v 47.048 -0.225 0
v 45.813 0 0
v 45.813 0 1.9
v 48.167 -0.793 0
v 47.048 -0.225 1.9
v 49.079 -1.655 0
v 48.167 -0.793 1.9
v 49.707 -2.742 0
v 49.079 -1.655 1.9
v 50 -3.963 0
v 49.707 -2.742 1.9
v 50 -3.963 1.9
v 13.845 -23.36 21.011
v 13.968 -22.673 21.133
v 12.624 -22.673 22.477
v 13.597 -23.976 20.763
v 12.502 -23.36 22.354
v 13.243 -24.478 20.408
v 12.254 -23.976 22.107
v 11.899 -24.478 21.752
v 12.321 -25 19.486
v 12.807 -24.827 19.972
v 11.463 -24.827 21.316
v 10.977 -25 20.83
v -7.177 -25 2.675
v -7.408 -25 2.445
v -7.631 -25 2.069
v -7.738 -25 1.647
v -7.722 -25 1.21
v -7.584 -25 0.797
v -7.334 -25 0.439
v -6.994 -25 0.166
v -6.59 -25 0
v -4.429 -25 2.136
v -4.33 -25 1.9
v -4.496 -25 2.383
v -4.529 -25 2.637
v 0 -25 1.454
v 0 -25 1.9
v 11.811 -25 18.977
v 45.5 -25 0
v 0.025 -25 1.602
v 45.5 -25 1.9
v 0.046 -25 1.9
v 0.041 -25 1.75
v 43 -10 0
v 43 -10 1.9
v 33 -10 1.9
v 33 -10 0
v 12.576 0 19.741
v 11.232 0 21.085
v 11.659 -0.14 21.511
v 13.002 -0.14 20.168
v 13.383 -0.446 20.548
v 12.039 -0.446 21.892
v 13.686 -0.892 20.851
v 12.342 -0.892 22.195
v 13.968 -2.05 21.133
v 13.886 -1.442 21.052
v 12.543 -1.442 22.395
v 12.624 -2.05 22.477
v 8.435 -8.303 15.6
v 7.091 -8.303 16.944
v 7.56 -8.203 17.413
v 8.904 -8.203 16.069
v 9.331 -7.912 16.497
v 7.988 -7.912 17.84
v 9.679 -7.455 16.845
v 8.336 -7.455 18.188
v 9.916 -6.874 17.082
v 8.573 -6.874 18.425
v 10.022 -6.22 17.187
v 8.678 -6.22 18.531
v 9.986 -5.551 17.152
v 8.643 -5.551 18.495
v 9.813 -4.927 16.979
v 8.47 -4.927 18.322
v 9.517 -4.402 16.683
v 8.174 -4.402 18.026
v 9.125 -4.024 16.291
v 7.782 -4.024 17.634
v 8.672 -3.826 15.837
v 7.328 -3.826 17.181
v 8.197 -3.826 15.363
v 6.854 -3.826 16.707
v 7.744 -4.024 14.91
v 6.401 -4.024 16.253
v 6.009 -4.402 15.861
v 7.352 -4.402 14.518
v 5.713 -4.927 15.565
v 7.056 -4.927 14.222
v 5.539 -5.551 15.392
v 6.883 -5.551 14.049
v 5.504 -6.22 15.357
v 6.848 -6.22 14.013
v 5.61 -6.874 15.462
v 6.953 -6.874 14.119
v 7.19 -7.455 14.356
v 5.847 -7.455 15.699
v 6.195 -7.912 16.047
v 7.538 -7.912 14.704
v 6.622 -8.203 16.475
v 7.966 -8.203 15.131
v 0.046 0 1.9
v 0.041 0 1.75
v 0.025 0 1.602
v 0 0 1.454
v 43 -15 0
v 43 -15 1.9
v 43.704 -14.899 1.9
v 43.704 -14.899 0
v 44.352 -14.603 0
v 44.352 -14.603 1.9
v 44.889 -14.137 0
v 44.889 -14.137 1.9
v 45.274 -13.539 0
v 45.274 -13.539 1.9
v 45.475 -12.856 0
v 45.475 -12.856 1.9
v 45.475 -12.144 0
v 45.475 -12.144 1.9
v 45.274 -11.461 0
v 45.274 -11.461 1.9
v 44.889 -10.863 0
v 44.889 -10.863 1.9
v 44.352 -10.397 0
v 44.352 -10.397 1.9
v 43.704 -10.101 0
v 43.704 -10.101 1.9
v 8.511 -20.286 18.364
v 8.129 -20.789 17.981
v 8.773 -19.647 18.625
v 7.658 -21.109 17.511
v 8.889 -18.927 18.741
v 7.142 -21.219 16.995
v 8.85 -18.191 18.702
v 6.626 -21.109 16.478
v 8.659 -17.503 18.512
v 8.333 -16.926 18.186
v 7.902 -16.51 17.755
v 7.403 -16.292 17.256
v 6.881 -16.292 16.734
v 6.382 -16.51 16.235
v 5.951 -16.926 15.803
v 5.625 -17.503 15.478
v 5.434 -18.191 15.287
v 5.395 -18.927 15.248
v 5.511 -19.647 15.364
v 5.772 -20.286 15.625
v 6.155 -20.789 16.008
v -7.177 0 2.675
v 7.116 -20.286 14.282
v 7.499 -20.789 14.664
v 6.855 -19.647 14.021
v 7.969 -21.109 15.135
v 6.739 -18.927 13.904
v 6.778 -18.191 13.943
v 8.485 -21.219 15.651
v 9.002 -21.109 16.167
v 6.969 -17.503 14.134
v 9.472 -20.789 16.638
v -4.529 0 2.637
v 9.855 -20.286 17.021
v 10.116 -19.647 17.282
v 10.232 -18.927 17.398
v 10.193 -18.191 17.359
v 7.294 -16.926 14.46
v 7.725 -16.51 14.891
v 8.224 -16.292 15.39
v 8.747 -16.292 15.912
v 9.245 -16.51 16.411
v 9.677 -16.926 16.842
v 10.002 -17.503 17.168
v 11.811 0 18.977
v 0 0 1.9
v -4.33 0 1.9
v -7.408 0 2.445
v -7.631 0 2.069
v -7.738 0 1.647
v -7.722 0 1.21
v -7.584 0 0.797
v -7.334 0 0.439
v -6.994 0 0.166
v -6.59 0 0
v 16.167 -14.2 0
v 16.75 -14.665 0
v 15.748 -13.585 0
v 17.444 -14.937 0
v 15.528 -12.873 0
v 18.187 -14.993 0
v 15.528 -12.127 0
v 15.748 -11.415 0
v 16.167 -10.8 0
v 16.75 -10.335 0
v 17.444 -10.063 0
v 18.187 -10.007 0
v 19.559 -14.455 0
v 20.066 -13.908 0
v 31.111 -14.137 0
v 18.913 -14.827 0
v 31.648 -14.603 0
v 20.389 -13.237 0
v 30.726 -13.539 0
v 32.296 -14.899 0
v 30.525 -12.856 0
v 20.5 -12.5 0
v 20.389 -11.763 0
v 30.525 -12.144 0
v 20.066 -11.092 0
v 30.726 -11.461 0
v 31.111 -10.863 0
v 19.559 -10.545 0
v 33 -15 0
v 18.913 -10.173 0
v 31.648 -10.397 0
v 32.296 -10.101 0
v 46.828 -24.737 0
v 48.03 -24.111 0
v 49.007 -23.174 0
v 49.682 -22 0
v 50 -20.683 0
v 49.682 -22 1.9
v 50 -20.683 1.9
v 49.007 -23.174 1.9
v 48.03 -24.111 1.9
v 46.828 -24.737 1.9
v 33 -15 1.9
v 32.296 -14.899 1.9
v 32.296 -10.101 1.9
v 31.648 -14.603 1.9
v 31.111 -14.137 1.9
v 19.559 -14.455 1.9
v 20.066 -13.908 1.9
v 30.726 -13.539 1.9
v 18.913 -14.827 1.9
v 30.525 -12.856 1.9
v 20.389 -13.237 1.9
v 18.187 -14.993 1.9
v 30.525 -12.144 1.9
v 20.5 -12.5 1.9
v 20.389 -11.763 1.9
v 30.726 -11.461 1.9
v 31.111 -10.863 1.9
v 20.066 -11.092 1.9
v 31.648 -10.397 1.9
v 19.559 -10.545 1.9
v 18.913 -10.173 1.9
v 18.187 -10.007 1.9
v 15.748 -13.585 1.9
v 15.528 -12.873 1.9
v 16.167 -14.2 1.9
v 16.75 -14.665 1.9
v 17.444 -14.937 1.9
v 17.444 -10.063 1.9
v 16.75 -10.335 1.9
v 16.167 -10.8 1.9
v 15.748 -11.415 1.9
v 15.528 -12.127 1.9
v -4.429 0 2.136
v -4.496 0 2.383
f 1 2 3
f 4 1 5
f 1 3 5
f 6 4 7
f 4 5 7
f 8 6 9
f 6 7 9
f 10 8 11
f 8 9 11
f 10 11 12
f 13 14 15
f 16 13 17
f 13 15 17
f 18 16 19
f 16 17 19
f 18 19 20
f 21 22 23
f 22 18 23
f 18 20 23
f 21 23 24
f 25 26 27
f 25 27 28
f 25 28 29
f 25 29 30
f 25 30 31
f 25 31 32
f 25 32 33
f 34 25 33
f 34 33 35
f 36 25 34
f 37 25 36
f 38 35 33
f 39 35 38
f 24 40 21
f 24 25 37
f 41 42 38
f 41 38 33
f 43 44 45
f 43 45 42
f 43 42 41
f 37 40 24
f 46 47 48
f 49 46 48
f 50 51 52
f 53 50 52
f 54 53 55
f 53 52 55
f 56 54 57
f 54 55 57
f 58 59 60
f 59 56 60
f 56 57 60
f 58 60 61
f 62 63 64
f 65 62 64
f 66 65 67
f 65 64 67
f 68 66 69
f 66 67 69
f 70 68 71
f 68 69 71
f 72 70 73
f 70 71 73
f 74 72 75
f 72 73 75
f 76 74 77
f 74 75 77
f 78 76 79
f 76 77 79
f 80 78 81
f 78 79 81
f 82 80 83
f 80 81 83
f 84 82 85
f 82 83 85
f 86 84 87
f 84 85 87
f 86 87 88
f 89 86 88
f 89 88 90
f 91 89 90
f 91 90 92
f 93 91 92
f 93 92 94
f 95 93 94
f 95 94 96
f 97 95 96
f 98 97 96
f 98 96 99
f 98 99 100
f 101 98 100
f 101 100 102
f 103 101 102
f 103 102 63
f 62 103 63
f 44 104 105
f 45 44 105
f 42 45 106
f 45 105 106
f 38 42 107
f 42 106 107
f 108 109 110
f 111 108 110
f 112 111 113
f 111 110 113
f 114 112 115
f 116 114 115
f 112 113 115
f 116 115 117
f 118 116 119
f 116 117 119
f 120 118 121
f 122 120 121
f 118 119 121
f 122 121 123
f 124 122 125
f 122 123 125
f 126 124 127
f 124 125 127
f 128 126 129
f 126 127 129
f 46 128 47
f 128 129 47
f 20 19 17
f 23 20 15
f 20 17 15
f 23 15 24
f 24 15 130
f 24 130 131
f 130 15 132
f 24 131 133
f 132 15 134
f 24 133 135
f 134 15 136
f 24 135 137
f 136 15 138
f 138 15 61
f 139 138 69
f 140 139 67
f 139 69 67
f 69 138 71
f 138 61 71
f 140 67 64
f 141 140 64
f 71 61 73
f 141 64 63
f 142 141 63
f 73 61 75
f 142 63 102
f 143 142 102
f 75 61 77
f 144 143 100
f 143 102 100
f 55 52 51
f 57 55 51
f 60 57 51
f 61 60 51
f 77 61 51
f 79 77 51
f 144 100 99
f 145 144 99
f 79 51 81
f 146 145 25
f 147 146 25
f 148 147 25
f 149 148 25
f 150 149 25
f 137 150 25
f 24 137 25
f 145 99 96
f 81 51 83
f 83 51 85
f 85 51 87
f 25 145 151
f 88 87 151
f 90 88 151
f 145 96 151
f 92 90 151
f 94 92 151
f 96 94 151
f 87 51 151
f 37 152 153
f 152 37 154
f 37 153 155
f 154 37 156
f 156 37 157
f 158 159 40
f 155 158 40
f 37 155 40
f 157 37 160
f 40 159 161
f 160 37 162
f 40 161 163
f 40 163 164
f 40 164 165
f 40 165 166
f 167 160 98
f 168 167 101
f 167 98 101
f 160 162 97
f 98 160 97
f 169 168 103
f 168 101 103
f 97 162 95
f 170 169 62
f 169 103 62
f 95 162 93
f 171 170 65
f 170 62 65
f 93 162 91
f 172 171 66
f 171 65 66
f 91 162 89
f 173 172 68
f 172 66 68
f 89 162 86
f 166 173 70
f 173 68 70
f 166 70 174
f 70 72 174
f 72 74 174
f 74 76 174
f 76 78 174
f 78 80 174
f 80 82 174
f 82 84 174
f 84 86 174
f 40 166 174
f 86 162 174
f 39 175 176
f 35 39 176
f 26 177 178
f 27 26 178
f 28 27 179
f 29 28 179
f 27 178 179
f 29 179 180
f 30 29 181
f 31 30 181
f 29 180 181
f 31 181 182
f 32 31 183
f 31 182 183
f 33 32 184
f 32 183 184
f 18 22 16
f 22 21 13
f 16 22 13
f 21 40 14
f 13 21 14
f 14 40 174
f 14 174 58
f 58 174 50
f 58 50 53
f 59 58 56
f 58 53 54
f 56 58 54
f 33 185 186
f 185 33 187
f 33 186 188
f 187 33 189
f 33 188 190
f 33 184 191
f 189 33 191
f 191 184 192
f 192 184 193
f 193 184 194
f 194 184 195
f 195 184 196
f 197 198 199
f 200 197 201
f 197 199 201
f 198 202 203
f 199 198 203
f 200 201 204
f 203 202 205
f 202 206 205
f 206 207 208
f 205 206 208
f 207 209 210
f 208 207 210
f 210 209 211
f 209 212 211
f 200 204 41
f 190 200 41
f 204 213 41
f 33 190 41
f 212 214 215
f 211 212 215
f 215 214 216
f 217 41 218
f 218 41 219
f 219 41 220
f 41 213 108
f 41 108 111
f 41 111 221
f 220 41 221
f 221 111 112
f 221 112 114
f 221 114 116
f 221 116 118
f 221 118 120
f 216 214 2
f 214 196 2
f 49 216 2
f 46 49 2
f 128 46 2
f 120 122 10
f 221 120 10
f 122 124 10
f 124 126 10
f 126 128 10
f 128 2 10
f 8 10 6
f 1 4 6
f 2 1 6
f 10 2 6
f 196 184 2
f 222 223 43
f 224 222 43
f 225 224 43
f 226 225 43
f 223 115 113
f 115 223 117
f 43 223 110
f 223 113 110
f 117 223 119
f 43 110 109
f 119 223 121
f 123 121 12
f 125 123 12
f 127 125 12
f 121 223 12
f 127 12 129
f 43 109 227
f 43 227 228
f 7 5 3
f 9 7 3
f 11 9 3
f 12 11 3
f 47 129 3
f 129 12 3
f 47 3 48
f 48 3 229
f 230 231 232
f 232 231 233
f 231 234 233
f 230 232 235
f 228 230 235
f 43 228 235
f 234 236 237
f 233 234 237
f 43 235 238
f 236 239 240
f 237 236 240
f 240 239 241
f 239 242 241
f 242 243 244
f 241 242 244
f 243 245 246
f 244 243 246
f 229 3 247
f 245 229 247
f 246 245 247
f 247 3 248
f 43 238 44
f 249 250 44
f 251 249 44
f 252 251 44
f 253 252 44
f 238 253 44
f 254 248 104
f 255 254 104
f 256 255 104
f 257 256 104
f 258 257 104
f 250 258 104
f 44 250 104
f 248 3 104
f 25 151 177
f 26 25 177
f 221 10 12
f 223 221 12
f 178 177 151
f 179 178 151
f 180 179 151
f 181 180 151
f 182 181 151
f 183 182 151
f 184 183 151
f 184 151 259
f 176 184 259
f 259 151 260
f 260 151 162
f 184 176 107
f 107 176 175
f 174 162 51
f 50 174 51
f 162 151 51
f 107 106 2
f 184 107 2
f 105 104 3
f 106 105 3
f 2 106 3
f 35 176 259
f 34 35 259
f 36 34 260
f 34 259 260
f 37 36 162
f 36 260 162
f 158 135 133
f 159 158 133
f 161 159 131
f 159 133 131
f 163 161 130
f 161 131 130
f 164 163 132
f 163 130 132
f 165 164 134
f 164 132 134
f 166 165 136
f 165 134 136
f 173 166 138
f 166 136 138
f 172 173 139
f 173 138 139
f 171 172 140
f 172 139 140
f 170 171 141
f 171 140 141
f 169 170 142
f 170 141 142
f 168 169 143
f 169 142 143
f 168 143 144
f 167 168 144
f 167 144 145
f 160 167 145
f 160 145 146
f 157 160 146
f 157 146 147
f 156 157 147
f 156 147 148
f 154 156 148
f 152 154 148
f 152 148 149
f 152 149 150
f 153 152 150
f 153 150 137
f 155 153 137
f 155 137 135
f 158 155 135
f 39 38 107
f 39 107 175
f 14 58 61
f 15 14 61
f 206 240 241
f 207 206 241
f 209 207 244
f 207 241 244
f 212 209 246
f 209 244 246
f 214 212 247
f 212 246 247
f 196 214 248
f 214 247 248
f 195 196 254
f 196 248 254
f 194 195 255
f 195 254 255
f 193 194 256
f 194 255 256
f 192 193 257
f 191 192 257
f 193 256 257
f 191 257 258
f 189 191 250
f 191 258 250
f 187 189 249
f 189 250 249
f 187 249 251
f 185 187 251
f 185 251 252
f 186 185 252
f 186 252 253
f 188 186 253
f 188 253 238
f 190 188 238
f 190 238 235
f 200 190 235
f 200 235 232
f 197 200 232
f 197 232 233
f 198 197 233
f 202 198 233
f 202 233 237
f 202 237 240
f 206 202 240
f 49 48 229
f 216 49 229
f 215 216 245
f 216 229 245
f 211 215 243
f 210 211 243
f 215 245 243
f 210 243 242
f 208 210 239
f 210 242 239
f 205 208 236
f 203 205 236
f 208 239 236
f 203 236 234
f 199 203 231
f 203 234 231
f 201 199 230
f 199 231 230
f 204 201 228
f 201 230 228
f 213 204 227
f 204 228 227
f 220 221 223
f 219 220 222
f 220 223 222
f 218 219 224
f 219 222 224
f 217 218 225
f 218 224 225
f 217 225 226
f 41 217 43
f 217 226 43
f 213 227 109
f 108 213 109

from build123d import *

# Parameters (mm, degrees)
F1_DEPTH = 25
F2_R     = 2.4771890227
F2_R_2   = 2.250855145
F3_DEPTH = 5
F5_DEPTH = 6
F6_R     = 2.5
F7_DEPTH = 25


with BuildPart() as f1:
    # F0 (on Front) → F1 (new body)
    with BuildSketch(Plane.XZ):
        with BuildLine():
            Line((-6.5901947265, 0), (0, 0))
            Line((0, 0), (0, 1.4541312475))
            Line((0, 1.4541312475), (0, 1.9))
            Line((0, 1.9), (-2.1543446928, 1.9))
            Line((-2.1543446928, 1.9), (-4.3302040632, 1.9))
            ThreePointArc((-4.3302040632, 1.9), (-4.4665240815, 2.2584645112), (-4.5287162974, 2.6368982326))
            Line((-4.5287162974, 2.6368982326), (-3.7099796114, 3.4556349186))
            Line((-3.7099796114, 3.4556349186), (11.8111070049, 18.9767215349))
            Line((11.8111070049, 18.9767215349), (13.9676899182, 21.1333044483))
            Line((13.9676899182, 21.1333044483), (12.624187034, 22.4768073325))
            Line((12.624187034, 22.4768073325), (-7.1773967105, 2.6752235881))
            Line((-7.1773967105, 2.6752235881), (-7.4079630013, 2.4446572973))
            ThreePointArc((-7.4079630013, 2.4446572973), (-7.6680055311, 0.9985643577), (-6.5901947265, 0))
        make_face()
        with BuildLine():
            Line((0, 1.4541312475), (0, 0))
            Line((0, 0), (50, 0))
            Line((50, 0), (50, 1.9))
            Line((50, 1.9), (0.0456553072, 1.9))
            ThreePointArc((0.0456553072, 1.9), (0.0342117177, 1.6758999378), (0, 1.4541312475))
        make_face()
    extrude(amount=F1_DEPTH)

    # F2 (on face) → F3 (cut)
    with BuildSketch(Plane(origin=(-4.9263101493, 0, 4.9263101493), x_dir=(0, -1, 0), z_dir=(-0.7071067812, 0, 0.7071067812))):
        with Locations((18.7418013811, 17.0671120286)):
            Circle(F2_R)
        with Locations((6.0519576073, 16.9952586293)):
            Circle(F2_R_2)
    extrude(amount=-F3_DEPTH, mode=Mode.SUBTRACT)

    # F4 (on face) → F5 (cut)
    with BuildSketch(Plane(origin=(-4.9263101493, 0, 4.9263101493), x_dir=(0, -1, 0), z_dir=(-0.7071067812, 0, 0.7071067812))):
        with BuildLine():
            Line((0, 24.8201511429), (0, 22.8517428041))
            ThreePointArc((0, 22.8517428041), (0.6533469706, 24.2230461475), (2.0500576593, 24.8201511429))
            Line((2.0500576593, 24.8201511429), (0, 24.8201511429))
        make_face()
        with BuildLine():
            ThreePointArc((22.6727053523, 24.8201511429), (24.2438861053, 24.062743833), (25, 22.4909402288))
            Line((25, 22.4909402288), (25, 24.8201511429))
            Line((25, 24.8201511429), (22.6727053523, 24.8201511429))
        make_face()
    extrude(amount=-F5_DEPTH, mode=Mode.SUBTRACT)

    # F6 (on face) → F7 (cut)
    with BuildSketch(Plane.XY.offset(1.9)):
        with BuildLine():
            ThreePointArc((45.8127014494, 0), (48.6544638234, -1.190988554), (50, -3.9629192031))
            Line((50, -3.9629192031), (50, 0))
            Line((50, 0), (45.8127014494, 0))
        make_face()
        with BuildLine():
            ThreePointArc((50, -20.6832401454), (48.5516700012, -23.6773197936), (45.5, -25))
            Line((45.5, -25), (50, -25))
            Line((50, -25), (50, -20.6832401454))
        make_face()
        with BuildLine():
            Line((33, -15), (43, -15))
            ThreePointArc((43, -15), (45.5, -12.5), (43, -10))
            Line((43, -10), (33, -10))
            ThreePointArc((33, -10), (30.5, -12.5), (33, -15))
        make_face()
        with Locations((18, -12.5)):
            Circle(F6_R)
    extrude(amount=-F7_DEPTH, mode=Mode.SUBTRACT)


solid = f1.part
